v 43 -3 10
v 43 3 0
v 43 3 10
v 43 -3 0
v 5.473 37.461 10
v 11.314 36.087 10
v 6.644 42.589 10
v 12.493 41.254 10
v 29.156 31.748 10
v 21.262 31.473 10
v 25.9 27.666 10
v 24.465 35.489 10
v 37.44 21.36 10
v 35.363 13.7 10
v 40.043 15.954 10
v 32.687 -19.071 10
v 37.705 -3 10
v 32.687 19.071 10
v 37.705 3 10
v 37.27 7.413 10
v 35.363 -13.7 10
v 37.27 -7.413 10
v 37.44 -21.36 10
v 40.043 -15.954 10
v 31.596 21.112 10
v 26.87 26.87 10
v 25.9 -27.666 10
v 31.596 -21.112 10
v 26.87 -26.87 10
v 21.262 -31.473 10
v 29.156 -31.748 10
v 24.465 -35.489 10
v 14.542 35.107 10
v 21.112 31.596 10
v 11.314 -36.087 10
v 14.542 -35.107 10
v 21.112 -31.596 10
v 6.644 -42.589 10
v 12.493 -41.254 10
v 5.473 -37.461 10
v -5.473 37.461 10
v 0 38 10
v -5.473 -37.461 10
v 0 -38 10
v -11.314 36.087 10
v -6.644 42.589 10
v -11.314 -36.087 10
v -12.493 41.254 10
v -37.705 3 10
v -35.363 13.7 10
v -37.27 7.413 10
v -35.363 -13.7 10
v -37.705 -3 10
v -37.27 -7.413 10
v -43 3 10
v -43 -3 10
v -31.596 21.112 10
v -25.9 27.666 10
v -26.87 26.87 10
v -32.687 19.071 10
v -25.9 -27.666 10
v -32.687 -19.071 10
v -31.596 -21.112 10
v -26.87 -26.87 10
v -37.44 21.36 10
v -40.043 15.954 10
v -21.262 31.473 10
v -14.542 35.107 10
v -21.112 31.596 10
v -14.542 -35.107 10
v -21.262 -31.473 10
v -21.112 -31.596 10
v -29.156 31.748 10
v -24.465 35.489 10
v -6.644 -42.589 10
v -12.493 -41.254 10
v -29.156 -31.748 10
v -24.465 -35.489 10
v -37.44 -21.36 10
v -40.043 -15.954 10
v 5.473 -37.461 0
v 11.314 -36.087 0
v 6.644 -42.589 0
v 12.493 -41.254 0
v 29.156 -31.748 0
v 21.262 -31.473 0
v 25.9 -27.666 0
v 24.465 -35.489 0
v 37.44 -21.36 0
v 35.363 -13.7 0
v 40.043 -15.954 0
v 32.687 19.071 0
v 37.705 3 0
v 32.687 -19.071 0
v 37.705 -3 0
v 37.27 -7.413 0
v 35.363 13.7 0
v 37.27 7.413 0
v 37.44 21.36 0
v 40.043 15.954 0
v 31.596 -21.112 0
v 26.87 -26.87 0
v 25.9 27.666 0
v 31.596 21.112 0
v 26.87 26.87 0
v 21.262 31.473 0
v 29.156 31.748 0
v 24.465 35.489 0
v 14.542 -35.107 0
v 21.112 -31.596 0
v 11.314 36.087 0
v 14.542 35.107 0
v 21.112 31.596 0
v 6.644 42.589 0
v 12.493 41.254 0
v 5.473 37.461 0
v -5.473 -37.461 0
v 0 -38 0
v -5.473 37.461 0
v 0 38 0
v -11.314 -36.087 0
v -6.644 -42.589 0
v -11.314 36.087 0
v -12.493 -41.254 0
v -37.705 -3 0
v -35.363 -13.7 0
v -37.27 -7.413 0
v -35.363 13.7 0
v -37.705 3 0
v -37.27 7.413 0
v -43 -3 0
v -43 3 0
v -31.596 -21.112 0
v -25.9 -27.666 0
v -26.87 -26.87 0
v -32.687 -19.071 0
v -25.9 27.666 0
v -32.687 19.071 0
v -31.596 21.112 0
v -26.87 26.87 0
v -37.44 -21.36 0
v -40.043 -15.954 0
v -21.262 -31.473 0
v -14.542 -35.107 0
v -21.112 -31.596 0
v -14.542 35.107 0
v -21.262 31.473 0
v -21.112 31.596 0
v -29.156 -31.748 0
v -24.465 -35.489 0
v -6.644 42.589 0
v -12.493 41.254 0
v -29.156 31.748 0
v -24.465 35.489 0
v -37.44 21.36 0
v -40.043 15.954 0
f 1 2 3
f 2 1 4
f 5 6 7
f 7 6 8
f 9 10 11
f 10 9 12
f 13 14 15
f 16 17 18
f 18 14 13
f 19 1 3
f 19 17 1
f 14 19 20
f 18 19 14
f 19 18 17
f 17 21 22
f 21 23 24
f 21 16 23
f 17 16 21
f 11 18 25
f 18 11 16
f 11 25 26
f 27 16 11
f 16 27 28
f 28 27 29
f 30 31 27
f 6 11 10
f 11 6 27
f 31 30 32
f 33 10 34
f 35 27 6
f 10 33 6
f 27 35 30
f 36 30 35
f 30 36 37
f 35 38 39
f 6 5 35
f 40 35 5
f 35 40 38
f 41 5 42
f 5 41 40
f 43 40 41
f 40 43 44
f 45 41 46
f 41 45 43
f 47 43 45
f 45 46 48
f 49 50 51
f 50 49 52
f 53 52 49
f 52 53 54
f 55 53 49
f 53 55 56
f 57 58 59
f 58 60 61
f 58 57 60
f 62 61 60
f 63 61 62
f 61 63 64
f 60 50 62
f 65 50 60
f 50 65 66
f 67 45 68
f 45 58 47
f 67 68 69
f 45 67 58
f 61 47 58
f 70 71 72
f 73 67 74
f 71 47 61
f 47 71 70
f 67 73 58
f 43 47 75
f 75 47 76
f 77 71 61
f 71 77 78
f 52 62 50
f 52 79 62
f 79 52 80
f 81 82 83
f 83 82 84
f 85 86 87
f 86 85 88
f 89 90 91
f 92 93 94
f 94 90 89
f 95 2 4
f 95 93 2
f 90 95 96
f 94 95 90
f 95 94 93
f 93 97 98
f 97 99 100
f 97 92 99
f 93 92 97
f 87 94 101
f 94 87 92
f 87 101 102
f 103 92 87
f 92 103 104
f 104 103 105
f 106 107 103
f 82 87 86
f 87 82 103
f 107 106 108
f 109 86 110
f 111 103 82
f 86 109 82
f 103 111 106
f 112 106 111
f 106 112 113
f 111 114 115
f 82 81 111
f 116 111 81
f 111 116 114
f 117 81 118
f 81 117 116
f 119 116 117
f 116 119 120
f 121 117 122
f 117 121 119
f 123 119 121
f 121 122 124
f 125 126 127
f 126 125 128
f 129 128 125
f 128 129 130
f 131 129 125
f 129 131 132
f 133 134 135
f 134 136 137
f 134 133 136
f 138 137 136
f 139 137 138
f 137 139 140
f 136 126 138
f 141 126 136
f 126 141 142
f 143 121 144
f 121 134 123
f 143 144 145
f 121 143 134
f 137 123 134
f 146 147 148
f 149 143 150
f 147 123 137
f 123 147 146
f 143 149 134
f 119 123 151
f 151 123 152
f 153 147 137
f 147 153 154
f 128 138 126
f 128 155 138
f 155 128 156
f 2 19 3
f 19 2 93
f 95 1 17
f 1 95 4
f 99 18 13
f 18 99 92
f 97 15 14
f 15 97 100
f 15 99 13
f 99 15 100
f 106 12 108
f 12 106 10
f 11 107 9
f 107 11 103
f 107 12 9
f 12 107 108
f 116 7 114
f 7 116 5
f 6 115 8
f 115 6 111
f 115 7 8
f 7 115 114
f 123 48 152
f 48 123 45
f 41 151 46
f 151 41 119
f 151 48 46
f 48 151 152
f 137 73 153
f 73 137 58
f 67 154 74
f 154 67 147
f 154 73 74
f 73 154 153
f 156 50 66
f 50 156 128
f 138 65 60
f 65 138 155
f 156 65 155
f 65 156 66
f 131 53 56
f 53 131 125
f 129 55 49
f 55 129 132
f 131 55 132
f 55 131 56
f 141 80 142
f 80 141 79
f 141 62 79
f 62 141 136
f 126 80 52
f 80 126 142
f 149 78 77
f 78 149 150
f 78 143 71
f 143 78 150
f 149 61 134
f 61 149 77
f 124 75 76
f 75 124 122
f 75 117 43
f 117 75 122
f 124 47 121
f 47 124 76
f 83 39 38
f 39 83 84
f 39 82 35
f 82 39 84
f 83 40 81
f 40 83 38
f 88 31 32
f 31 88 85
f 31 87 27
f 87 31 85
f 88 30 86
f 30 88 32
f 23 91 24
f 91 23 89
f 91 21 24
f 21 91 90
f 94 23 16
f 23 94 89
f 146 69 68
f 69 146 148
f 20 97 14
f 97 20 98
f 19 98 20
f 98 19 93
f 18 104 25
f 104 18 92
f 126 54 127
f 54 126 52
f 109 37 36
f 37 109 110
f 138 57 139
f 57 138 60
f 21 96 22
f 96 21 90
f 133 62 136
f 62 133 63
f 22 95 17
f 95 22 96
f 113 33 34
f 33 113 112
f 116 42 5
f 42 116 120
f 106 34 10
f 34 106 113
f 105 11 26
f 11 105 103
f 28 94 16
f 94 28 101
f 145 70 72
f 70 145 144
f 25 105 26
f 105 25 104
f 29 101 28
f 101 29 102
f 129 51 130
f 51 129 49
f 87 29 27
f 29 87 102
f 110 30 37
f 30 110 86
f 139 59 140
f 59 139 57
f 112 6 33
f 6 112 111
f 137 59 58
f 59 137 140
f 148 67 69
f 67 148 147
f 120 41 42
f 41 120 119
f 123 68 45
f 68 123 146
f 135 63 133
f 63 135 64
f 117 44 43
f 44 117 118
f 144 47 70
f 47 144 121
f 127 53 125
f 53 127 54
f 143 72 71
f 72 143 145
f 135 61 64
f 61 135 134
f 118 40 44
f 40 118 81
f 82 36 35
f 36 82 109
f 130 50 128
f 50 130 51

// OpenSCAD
$fn = 32;

// ----------------------------------------------------------------------
// Spur blank: plain gear blank
// ----------------------------------------------------------------------

// --- parameters (mm) ---
disc_r = 38;              // blank root radius
disc_t = 10;              // blank thickness
n_teeth = 14;             // stub tooth count
tooth_w = 6;              // tooth width at the root
tooth_h = 5;              // tooth height above the root

out_r = disc_r + tooth_h;  // tip radius
bbox_x = 86.0;  // measured width over the teeth
bbox_y = 85.18;  // measured depth over the teeth

union() {
  cylinder(r = disc_r, h = disc_t);
  for (i = [0 : n_teeth - 1])
    rotate([0, 0, i * 360 / n_teeth])
      translate([disc_r - 1, -tooth_w / 2, 0])
        cube([tooth_h + 1, tooth_w, disc_t]);
}
